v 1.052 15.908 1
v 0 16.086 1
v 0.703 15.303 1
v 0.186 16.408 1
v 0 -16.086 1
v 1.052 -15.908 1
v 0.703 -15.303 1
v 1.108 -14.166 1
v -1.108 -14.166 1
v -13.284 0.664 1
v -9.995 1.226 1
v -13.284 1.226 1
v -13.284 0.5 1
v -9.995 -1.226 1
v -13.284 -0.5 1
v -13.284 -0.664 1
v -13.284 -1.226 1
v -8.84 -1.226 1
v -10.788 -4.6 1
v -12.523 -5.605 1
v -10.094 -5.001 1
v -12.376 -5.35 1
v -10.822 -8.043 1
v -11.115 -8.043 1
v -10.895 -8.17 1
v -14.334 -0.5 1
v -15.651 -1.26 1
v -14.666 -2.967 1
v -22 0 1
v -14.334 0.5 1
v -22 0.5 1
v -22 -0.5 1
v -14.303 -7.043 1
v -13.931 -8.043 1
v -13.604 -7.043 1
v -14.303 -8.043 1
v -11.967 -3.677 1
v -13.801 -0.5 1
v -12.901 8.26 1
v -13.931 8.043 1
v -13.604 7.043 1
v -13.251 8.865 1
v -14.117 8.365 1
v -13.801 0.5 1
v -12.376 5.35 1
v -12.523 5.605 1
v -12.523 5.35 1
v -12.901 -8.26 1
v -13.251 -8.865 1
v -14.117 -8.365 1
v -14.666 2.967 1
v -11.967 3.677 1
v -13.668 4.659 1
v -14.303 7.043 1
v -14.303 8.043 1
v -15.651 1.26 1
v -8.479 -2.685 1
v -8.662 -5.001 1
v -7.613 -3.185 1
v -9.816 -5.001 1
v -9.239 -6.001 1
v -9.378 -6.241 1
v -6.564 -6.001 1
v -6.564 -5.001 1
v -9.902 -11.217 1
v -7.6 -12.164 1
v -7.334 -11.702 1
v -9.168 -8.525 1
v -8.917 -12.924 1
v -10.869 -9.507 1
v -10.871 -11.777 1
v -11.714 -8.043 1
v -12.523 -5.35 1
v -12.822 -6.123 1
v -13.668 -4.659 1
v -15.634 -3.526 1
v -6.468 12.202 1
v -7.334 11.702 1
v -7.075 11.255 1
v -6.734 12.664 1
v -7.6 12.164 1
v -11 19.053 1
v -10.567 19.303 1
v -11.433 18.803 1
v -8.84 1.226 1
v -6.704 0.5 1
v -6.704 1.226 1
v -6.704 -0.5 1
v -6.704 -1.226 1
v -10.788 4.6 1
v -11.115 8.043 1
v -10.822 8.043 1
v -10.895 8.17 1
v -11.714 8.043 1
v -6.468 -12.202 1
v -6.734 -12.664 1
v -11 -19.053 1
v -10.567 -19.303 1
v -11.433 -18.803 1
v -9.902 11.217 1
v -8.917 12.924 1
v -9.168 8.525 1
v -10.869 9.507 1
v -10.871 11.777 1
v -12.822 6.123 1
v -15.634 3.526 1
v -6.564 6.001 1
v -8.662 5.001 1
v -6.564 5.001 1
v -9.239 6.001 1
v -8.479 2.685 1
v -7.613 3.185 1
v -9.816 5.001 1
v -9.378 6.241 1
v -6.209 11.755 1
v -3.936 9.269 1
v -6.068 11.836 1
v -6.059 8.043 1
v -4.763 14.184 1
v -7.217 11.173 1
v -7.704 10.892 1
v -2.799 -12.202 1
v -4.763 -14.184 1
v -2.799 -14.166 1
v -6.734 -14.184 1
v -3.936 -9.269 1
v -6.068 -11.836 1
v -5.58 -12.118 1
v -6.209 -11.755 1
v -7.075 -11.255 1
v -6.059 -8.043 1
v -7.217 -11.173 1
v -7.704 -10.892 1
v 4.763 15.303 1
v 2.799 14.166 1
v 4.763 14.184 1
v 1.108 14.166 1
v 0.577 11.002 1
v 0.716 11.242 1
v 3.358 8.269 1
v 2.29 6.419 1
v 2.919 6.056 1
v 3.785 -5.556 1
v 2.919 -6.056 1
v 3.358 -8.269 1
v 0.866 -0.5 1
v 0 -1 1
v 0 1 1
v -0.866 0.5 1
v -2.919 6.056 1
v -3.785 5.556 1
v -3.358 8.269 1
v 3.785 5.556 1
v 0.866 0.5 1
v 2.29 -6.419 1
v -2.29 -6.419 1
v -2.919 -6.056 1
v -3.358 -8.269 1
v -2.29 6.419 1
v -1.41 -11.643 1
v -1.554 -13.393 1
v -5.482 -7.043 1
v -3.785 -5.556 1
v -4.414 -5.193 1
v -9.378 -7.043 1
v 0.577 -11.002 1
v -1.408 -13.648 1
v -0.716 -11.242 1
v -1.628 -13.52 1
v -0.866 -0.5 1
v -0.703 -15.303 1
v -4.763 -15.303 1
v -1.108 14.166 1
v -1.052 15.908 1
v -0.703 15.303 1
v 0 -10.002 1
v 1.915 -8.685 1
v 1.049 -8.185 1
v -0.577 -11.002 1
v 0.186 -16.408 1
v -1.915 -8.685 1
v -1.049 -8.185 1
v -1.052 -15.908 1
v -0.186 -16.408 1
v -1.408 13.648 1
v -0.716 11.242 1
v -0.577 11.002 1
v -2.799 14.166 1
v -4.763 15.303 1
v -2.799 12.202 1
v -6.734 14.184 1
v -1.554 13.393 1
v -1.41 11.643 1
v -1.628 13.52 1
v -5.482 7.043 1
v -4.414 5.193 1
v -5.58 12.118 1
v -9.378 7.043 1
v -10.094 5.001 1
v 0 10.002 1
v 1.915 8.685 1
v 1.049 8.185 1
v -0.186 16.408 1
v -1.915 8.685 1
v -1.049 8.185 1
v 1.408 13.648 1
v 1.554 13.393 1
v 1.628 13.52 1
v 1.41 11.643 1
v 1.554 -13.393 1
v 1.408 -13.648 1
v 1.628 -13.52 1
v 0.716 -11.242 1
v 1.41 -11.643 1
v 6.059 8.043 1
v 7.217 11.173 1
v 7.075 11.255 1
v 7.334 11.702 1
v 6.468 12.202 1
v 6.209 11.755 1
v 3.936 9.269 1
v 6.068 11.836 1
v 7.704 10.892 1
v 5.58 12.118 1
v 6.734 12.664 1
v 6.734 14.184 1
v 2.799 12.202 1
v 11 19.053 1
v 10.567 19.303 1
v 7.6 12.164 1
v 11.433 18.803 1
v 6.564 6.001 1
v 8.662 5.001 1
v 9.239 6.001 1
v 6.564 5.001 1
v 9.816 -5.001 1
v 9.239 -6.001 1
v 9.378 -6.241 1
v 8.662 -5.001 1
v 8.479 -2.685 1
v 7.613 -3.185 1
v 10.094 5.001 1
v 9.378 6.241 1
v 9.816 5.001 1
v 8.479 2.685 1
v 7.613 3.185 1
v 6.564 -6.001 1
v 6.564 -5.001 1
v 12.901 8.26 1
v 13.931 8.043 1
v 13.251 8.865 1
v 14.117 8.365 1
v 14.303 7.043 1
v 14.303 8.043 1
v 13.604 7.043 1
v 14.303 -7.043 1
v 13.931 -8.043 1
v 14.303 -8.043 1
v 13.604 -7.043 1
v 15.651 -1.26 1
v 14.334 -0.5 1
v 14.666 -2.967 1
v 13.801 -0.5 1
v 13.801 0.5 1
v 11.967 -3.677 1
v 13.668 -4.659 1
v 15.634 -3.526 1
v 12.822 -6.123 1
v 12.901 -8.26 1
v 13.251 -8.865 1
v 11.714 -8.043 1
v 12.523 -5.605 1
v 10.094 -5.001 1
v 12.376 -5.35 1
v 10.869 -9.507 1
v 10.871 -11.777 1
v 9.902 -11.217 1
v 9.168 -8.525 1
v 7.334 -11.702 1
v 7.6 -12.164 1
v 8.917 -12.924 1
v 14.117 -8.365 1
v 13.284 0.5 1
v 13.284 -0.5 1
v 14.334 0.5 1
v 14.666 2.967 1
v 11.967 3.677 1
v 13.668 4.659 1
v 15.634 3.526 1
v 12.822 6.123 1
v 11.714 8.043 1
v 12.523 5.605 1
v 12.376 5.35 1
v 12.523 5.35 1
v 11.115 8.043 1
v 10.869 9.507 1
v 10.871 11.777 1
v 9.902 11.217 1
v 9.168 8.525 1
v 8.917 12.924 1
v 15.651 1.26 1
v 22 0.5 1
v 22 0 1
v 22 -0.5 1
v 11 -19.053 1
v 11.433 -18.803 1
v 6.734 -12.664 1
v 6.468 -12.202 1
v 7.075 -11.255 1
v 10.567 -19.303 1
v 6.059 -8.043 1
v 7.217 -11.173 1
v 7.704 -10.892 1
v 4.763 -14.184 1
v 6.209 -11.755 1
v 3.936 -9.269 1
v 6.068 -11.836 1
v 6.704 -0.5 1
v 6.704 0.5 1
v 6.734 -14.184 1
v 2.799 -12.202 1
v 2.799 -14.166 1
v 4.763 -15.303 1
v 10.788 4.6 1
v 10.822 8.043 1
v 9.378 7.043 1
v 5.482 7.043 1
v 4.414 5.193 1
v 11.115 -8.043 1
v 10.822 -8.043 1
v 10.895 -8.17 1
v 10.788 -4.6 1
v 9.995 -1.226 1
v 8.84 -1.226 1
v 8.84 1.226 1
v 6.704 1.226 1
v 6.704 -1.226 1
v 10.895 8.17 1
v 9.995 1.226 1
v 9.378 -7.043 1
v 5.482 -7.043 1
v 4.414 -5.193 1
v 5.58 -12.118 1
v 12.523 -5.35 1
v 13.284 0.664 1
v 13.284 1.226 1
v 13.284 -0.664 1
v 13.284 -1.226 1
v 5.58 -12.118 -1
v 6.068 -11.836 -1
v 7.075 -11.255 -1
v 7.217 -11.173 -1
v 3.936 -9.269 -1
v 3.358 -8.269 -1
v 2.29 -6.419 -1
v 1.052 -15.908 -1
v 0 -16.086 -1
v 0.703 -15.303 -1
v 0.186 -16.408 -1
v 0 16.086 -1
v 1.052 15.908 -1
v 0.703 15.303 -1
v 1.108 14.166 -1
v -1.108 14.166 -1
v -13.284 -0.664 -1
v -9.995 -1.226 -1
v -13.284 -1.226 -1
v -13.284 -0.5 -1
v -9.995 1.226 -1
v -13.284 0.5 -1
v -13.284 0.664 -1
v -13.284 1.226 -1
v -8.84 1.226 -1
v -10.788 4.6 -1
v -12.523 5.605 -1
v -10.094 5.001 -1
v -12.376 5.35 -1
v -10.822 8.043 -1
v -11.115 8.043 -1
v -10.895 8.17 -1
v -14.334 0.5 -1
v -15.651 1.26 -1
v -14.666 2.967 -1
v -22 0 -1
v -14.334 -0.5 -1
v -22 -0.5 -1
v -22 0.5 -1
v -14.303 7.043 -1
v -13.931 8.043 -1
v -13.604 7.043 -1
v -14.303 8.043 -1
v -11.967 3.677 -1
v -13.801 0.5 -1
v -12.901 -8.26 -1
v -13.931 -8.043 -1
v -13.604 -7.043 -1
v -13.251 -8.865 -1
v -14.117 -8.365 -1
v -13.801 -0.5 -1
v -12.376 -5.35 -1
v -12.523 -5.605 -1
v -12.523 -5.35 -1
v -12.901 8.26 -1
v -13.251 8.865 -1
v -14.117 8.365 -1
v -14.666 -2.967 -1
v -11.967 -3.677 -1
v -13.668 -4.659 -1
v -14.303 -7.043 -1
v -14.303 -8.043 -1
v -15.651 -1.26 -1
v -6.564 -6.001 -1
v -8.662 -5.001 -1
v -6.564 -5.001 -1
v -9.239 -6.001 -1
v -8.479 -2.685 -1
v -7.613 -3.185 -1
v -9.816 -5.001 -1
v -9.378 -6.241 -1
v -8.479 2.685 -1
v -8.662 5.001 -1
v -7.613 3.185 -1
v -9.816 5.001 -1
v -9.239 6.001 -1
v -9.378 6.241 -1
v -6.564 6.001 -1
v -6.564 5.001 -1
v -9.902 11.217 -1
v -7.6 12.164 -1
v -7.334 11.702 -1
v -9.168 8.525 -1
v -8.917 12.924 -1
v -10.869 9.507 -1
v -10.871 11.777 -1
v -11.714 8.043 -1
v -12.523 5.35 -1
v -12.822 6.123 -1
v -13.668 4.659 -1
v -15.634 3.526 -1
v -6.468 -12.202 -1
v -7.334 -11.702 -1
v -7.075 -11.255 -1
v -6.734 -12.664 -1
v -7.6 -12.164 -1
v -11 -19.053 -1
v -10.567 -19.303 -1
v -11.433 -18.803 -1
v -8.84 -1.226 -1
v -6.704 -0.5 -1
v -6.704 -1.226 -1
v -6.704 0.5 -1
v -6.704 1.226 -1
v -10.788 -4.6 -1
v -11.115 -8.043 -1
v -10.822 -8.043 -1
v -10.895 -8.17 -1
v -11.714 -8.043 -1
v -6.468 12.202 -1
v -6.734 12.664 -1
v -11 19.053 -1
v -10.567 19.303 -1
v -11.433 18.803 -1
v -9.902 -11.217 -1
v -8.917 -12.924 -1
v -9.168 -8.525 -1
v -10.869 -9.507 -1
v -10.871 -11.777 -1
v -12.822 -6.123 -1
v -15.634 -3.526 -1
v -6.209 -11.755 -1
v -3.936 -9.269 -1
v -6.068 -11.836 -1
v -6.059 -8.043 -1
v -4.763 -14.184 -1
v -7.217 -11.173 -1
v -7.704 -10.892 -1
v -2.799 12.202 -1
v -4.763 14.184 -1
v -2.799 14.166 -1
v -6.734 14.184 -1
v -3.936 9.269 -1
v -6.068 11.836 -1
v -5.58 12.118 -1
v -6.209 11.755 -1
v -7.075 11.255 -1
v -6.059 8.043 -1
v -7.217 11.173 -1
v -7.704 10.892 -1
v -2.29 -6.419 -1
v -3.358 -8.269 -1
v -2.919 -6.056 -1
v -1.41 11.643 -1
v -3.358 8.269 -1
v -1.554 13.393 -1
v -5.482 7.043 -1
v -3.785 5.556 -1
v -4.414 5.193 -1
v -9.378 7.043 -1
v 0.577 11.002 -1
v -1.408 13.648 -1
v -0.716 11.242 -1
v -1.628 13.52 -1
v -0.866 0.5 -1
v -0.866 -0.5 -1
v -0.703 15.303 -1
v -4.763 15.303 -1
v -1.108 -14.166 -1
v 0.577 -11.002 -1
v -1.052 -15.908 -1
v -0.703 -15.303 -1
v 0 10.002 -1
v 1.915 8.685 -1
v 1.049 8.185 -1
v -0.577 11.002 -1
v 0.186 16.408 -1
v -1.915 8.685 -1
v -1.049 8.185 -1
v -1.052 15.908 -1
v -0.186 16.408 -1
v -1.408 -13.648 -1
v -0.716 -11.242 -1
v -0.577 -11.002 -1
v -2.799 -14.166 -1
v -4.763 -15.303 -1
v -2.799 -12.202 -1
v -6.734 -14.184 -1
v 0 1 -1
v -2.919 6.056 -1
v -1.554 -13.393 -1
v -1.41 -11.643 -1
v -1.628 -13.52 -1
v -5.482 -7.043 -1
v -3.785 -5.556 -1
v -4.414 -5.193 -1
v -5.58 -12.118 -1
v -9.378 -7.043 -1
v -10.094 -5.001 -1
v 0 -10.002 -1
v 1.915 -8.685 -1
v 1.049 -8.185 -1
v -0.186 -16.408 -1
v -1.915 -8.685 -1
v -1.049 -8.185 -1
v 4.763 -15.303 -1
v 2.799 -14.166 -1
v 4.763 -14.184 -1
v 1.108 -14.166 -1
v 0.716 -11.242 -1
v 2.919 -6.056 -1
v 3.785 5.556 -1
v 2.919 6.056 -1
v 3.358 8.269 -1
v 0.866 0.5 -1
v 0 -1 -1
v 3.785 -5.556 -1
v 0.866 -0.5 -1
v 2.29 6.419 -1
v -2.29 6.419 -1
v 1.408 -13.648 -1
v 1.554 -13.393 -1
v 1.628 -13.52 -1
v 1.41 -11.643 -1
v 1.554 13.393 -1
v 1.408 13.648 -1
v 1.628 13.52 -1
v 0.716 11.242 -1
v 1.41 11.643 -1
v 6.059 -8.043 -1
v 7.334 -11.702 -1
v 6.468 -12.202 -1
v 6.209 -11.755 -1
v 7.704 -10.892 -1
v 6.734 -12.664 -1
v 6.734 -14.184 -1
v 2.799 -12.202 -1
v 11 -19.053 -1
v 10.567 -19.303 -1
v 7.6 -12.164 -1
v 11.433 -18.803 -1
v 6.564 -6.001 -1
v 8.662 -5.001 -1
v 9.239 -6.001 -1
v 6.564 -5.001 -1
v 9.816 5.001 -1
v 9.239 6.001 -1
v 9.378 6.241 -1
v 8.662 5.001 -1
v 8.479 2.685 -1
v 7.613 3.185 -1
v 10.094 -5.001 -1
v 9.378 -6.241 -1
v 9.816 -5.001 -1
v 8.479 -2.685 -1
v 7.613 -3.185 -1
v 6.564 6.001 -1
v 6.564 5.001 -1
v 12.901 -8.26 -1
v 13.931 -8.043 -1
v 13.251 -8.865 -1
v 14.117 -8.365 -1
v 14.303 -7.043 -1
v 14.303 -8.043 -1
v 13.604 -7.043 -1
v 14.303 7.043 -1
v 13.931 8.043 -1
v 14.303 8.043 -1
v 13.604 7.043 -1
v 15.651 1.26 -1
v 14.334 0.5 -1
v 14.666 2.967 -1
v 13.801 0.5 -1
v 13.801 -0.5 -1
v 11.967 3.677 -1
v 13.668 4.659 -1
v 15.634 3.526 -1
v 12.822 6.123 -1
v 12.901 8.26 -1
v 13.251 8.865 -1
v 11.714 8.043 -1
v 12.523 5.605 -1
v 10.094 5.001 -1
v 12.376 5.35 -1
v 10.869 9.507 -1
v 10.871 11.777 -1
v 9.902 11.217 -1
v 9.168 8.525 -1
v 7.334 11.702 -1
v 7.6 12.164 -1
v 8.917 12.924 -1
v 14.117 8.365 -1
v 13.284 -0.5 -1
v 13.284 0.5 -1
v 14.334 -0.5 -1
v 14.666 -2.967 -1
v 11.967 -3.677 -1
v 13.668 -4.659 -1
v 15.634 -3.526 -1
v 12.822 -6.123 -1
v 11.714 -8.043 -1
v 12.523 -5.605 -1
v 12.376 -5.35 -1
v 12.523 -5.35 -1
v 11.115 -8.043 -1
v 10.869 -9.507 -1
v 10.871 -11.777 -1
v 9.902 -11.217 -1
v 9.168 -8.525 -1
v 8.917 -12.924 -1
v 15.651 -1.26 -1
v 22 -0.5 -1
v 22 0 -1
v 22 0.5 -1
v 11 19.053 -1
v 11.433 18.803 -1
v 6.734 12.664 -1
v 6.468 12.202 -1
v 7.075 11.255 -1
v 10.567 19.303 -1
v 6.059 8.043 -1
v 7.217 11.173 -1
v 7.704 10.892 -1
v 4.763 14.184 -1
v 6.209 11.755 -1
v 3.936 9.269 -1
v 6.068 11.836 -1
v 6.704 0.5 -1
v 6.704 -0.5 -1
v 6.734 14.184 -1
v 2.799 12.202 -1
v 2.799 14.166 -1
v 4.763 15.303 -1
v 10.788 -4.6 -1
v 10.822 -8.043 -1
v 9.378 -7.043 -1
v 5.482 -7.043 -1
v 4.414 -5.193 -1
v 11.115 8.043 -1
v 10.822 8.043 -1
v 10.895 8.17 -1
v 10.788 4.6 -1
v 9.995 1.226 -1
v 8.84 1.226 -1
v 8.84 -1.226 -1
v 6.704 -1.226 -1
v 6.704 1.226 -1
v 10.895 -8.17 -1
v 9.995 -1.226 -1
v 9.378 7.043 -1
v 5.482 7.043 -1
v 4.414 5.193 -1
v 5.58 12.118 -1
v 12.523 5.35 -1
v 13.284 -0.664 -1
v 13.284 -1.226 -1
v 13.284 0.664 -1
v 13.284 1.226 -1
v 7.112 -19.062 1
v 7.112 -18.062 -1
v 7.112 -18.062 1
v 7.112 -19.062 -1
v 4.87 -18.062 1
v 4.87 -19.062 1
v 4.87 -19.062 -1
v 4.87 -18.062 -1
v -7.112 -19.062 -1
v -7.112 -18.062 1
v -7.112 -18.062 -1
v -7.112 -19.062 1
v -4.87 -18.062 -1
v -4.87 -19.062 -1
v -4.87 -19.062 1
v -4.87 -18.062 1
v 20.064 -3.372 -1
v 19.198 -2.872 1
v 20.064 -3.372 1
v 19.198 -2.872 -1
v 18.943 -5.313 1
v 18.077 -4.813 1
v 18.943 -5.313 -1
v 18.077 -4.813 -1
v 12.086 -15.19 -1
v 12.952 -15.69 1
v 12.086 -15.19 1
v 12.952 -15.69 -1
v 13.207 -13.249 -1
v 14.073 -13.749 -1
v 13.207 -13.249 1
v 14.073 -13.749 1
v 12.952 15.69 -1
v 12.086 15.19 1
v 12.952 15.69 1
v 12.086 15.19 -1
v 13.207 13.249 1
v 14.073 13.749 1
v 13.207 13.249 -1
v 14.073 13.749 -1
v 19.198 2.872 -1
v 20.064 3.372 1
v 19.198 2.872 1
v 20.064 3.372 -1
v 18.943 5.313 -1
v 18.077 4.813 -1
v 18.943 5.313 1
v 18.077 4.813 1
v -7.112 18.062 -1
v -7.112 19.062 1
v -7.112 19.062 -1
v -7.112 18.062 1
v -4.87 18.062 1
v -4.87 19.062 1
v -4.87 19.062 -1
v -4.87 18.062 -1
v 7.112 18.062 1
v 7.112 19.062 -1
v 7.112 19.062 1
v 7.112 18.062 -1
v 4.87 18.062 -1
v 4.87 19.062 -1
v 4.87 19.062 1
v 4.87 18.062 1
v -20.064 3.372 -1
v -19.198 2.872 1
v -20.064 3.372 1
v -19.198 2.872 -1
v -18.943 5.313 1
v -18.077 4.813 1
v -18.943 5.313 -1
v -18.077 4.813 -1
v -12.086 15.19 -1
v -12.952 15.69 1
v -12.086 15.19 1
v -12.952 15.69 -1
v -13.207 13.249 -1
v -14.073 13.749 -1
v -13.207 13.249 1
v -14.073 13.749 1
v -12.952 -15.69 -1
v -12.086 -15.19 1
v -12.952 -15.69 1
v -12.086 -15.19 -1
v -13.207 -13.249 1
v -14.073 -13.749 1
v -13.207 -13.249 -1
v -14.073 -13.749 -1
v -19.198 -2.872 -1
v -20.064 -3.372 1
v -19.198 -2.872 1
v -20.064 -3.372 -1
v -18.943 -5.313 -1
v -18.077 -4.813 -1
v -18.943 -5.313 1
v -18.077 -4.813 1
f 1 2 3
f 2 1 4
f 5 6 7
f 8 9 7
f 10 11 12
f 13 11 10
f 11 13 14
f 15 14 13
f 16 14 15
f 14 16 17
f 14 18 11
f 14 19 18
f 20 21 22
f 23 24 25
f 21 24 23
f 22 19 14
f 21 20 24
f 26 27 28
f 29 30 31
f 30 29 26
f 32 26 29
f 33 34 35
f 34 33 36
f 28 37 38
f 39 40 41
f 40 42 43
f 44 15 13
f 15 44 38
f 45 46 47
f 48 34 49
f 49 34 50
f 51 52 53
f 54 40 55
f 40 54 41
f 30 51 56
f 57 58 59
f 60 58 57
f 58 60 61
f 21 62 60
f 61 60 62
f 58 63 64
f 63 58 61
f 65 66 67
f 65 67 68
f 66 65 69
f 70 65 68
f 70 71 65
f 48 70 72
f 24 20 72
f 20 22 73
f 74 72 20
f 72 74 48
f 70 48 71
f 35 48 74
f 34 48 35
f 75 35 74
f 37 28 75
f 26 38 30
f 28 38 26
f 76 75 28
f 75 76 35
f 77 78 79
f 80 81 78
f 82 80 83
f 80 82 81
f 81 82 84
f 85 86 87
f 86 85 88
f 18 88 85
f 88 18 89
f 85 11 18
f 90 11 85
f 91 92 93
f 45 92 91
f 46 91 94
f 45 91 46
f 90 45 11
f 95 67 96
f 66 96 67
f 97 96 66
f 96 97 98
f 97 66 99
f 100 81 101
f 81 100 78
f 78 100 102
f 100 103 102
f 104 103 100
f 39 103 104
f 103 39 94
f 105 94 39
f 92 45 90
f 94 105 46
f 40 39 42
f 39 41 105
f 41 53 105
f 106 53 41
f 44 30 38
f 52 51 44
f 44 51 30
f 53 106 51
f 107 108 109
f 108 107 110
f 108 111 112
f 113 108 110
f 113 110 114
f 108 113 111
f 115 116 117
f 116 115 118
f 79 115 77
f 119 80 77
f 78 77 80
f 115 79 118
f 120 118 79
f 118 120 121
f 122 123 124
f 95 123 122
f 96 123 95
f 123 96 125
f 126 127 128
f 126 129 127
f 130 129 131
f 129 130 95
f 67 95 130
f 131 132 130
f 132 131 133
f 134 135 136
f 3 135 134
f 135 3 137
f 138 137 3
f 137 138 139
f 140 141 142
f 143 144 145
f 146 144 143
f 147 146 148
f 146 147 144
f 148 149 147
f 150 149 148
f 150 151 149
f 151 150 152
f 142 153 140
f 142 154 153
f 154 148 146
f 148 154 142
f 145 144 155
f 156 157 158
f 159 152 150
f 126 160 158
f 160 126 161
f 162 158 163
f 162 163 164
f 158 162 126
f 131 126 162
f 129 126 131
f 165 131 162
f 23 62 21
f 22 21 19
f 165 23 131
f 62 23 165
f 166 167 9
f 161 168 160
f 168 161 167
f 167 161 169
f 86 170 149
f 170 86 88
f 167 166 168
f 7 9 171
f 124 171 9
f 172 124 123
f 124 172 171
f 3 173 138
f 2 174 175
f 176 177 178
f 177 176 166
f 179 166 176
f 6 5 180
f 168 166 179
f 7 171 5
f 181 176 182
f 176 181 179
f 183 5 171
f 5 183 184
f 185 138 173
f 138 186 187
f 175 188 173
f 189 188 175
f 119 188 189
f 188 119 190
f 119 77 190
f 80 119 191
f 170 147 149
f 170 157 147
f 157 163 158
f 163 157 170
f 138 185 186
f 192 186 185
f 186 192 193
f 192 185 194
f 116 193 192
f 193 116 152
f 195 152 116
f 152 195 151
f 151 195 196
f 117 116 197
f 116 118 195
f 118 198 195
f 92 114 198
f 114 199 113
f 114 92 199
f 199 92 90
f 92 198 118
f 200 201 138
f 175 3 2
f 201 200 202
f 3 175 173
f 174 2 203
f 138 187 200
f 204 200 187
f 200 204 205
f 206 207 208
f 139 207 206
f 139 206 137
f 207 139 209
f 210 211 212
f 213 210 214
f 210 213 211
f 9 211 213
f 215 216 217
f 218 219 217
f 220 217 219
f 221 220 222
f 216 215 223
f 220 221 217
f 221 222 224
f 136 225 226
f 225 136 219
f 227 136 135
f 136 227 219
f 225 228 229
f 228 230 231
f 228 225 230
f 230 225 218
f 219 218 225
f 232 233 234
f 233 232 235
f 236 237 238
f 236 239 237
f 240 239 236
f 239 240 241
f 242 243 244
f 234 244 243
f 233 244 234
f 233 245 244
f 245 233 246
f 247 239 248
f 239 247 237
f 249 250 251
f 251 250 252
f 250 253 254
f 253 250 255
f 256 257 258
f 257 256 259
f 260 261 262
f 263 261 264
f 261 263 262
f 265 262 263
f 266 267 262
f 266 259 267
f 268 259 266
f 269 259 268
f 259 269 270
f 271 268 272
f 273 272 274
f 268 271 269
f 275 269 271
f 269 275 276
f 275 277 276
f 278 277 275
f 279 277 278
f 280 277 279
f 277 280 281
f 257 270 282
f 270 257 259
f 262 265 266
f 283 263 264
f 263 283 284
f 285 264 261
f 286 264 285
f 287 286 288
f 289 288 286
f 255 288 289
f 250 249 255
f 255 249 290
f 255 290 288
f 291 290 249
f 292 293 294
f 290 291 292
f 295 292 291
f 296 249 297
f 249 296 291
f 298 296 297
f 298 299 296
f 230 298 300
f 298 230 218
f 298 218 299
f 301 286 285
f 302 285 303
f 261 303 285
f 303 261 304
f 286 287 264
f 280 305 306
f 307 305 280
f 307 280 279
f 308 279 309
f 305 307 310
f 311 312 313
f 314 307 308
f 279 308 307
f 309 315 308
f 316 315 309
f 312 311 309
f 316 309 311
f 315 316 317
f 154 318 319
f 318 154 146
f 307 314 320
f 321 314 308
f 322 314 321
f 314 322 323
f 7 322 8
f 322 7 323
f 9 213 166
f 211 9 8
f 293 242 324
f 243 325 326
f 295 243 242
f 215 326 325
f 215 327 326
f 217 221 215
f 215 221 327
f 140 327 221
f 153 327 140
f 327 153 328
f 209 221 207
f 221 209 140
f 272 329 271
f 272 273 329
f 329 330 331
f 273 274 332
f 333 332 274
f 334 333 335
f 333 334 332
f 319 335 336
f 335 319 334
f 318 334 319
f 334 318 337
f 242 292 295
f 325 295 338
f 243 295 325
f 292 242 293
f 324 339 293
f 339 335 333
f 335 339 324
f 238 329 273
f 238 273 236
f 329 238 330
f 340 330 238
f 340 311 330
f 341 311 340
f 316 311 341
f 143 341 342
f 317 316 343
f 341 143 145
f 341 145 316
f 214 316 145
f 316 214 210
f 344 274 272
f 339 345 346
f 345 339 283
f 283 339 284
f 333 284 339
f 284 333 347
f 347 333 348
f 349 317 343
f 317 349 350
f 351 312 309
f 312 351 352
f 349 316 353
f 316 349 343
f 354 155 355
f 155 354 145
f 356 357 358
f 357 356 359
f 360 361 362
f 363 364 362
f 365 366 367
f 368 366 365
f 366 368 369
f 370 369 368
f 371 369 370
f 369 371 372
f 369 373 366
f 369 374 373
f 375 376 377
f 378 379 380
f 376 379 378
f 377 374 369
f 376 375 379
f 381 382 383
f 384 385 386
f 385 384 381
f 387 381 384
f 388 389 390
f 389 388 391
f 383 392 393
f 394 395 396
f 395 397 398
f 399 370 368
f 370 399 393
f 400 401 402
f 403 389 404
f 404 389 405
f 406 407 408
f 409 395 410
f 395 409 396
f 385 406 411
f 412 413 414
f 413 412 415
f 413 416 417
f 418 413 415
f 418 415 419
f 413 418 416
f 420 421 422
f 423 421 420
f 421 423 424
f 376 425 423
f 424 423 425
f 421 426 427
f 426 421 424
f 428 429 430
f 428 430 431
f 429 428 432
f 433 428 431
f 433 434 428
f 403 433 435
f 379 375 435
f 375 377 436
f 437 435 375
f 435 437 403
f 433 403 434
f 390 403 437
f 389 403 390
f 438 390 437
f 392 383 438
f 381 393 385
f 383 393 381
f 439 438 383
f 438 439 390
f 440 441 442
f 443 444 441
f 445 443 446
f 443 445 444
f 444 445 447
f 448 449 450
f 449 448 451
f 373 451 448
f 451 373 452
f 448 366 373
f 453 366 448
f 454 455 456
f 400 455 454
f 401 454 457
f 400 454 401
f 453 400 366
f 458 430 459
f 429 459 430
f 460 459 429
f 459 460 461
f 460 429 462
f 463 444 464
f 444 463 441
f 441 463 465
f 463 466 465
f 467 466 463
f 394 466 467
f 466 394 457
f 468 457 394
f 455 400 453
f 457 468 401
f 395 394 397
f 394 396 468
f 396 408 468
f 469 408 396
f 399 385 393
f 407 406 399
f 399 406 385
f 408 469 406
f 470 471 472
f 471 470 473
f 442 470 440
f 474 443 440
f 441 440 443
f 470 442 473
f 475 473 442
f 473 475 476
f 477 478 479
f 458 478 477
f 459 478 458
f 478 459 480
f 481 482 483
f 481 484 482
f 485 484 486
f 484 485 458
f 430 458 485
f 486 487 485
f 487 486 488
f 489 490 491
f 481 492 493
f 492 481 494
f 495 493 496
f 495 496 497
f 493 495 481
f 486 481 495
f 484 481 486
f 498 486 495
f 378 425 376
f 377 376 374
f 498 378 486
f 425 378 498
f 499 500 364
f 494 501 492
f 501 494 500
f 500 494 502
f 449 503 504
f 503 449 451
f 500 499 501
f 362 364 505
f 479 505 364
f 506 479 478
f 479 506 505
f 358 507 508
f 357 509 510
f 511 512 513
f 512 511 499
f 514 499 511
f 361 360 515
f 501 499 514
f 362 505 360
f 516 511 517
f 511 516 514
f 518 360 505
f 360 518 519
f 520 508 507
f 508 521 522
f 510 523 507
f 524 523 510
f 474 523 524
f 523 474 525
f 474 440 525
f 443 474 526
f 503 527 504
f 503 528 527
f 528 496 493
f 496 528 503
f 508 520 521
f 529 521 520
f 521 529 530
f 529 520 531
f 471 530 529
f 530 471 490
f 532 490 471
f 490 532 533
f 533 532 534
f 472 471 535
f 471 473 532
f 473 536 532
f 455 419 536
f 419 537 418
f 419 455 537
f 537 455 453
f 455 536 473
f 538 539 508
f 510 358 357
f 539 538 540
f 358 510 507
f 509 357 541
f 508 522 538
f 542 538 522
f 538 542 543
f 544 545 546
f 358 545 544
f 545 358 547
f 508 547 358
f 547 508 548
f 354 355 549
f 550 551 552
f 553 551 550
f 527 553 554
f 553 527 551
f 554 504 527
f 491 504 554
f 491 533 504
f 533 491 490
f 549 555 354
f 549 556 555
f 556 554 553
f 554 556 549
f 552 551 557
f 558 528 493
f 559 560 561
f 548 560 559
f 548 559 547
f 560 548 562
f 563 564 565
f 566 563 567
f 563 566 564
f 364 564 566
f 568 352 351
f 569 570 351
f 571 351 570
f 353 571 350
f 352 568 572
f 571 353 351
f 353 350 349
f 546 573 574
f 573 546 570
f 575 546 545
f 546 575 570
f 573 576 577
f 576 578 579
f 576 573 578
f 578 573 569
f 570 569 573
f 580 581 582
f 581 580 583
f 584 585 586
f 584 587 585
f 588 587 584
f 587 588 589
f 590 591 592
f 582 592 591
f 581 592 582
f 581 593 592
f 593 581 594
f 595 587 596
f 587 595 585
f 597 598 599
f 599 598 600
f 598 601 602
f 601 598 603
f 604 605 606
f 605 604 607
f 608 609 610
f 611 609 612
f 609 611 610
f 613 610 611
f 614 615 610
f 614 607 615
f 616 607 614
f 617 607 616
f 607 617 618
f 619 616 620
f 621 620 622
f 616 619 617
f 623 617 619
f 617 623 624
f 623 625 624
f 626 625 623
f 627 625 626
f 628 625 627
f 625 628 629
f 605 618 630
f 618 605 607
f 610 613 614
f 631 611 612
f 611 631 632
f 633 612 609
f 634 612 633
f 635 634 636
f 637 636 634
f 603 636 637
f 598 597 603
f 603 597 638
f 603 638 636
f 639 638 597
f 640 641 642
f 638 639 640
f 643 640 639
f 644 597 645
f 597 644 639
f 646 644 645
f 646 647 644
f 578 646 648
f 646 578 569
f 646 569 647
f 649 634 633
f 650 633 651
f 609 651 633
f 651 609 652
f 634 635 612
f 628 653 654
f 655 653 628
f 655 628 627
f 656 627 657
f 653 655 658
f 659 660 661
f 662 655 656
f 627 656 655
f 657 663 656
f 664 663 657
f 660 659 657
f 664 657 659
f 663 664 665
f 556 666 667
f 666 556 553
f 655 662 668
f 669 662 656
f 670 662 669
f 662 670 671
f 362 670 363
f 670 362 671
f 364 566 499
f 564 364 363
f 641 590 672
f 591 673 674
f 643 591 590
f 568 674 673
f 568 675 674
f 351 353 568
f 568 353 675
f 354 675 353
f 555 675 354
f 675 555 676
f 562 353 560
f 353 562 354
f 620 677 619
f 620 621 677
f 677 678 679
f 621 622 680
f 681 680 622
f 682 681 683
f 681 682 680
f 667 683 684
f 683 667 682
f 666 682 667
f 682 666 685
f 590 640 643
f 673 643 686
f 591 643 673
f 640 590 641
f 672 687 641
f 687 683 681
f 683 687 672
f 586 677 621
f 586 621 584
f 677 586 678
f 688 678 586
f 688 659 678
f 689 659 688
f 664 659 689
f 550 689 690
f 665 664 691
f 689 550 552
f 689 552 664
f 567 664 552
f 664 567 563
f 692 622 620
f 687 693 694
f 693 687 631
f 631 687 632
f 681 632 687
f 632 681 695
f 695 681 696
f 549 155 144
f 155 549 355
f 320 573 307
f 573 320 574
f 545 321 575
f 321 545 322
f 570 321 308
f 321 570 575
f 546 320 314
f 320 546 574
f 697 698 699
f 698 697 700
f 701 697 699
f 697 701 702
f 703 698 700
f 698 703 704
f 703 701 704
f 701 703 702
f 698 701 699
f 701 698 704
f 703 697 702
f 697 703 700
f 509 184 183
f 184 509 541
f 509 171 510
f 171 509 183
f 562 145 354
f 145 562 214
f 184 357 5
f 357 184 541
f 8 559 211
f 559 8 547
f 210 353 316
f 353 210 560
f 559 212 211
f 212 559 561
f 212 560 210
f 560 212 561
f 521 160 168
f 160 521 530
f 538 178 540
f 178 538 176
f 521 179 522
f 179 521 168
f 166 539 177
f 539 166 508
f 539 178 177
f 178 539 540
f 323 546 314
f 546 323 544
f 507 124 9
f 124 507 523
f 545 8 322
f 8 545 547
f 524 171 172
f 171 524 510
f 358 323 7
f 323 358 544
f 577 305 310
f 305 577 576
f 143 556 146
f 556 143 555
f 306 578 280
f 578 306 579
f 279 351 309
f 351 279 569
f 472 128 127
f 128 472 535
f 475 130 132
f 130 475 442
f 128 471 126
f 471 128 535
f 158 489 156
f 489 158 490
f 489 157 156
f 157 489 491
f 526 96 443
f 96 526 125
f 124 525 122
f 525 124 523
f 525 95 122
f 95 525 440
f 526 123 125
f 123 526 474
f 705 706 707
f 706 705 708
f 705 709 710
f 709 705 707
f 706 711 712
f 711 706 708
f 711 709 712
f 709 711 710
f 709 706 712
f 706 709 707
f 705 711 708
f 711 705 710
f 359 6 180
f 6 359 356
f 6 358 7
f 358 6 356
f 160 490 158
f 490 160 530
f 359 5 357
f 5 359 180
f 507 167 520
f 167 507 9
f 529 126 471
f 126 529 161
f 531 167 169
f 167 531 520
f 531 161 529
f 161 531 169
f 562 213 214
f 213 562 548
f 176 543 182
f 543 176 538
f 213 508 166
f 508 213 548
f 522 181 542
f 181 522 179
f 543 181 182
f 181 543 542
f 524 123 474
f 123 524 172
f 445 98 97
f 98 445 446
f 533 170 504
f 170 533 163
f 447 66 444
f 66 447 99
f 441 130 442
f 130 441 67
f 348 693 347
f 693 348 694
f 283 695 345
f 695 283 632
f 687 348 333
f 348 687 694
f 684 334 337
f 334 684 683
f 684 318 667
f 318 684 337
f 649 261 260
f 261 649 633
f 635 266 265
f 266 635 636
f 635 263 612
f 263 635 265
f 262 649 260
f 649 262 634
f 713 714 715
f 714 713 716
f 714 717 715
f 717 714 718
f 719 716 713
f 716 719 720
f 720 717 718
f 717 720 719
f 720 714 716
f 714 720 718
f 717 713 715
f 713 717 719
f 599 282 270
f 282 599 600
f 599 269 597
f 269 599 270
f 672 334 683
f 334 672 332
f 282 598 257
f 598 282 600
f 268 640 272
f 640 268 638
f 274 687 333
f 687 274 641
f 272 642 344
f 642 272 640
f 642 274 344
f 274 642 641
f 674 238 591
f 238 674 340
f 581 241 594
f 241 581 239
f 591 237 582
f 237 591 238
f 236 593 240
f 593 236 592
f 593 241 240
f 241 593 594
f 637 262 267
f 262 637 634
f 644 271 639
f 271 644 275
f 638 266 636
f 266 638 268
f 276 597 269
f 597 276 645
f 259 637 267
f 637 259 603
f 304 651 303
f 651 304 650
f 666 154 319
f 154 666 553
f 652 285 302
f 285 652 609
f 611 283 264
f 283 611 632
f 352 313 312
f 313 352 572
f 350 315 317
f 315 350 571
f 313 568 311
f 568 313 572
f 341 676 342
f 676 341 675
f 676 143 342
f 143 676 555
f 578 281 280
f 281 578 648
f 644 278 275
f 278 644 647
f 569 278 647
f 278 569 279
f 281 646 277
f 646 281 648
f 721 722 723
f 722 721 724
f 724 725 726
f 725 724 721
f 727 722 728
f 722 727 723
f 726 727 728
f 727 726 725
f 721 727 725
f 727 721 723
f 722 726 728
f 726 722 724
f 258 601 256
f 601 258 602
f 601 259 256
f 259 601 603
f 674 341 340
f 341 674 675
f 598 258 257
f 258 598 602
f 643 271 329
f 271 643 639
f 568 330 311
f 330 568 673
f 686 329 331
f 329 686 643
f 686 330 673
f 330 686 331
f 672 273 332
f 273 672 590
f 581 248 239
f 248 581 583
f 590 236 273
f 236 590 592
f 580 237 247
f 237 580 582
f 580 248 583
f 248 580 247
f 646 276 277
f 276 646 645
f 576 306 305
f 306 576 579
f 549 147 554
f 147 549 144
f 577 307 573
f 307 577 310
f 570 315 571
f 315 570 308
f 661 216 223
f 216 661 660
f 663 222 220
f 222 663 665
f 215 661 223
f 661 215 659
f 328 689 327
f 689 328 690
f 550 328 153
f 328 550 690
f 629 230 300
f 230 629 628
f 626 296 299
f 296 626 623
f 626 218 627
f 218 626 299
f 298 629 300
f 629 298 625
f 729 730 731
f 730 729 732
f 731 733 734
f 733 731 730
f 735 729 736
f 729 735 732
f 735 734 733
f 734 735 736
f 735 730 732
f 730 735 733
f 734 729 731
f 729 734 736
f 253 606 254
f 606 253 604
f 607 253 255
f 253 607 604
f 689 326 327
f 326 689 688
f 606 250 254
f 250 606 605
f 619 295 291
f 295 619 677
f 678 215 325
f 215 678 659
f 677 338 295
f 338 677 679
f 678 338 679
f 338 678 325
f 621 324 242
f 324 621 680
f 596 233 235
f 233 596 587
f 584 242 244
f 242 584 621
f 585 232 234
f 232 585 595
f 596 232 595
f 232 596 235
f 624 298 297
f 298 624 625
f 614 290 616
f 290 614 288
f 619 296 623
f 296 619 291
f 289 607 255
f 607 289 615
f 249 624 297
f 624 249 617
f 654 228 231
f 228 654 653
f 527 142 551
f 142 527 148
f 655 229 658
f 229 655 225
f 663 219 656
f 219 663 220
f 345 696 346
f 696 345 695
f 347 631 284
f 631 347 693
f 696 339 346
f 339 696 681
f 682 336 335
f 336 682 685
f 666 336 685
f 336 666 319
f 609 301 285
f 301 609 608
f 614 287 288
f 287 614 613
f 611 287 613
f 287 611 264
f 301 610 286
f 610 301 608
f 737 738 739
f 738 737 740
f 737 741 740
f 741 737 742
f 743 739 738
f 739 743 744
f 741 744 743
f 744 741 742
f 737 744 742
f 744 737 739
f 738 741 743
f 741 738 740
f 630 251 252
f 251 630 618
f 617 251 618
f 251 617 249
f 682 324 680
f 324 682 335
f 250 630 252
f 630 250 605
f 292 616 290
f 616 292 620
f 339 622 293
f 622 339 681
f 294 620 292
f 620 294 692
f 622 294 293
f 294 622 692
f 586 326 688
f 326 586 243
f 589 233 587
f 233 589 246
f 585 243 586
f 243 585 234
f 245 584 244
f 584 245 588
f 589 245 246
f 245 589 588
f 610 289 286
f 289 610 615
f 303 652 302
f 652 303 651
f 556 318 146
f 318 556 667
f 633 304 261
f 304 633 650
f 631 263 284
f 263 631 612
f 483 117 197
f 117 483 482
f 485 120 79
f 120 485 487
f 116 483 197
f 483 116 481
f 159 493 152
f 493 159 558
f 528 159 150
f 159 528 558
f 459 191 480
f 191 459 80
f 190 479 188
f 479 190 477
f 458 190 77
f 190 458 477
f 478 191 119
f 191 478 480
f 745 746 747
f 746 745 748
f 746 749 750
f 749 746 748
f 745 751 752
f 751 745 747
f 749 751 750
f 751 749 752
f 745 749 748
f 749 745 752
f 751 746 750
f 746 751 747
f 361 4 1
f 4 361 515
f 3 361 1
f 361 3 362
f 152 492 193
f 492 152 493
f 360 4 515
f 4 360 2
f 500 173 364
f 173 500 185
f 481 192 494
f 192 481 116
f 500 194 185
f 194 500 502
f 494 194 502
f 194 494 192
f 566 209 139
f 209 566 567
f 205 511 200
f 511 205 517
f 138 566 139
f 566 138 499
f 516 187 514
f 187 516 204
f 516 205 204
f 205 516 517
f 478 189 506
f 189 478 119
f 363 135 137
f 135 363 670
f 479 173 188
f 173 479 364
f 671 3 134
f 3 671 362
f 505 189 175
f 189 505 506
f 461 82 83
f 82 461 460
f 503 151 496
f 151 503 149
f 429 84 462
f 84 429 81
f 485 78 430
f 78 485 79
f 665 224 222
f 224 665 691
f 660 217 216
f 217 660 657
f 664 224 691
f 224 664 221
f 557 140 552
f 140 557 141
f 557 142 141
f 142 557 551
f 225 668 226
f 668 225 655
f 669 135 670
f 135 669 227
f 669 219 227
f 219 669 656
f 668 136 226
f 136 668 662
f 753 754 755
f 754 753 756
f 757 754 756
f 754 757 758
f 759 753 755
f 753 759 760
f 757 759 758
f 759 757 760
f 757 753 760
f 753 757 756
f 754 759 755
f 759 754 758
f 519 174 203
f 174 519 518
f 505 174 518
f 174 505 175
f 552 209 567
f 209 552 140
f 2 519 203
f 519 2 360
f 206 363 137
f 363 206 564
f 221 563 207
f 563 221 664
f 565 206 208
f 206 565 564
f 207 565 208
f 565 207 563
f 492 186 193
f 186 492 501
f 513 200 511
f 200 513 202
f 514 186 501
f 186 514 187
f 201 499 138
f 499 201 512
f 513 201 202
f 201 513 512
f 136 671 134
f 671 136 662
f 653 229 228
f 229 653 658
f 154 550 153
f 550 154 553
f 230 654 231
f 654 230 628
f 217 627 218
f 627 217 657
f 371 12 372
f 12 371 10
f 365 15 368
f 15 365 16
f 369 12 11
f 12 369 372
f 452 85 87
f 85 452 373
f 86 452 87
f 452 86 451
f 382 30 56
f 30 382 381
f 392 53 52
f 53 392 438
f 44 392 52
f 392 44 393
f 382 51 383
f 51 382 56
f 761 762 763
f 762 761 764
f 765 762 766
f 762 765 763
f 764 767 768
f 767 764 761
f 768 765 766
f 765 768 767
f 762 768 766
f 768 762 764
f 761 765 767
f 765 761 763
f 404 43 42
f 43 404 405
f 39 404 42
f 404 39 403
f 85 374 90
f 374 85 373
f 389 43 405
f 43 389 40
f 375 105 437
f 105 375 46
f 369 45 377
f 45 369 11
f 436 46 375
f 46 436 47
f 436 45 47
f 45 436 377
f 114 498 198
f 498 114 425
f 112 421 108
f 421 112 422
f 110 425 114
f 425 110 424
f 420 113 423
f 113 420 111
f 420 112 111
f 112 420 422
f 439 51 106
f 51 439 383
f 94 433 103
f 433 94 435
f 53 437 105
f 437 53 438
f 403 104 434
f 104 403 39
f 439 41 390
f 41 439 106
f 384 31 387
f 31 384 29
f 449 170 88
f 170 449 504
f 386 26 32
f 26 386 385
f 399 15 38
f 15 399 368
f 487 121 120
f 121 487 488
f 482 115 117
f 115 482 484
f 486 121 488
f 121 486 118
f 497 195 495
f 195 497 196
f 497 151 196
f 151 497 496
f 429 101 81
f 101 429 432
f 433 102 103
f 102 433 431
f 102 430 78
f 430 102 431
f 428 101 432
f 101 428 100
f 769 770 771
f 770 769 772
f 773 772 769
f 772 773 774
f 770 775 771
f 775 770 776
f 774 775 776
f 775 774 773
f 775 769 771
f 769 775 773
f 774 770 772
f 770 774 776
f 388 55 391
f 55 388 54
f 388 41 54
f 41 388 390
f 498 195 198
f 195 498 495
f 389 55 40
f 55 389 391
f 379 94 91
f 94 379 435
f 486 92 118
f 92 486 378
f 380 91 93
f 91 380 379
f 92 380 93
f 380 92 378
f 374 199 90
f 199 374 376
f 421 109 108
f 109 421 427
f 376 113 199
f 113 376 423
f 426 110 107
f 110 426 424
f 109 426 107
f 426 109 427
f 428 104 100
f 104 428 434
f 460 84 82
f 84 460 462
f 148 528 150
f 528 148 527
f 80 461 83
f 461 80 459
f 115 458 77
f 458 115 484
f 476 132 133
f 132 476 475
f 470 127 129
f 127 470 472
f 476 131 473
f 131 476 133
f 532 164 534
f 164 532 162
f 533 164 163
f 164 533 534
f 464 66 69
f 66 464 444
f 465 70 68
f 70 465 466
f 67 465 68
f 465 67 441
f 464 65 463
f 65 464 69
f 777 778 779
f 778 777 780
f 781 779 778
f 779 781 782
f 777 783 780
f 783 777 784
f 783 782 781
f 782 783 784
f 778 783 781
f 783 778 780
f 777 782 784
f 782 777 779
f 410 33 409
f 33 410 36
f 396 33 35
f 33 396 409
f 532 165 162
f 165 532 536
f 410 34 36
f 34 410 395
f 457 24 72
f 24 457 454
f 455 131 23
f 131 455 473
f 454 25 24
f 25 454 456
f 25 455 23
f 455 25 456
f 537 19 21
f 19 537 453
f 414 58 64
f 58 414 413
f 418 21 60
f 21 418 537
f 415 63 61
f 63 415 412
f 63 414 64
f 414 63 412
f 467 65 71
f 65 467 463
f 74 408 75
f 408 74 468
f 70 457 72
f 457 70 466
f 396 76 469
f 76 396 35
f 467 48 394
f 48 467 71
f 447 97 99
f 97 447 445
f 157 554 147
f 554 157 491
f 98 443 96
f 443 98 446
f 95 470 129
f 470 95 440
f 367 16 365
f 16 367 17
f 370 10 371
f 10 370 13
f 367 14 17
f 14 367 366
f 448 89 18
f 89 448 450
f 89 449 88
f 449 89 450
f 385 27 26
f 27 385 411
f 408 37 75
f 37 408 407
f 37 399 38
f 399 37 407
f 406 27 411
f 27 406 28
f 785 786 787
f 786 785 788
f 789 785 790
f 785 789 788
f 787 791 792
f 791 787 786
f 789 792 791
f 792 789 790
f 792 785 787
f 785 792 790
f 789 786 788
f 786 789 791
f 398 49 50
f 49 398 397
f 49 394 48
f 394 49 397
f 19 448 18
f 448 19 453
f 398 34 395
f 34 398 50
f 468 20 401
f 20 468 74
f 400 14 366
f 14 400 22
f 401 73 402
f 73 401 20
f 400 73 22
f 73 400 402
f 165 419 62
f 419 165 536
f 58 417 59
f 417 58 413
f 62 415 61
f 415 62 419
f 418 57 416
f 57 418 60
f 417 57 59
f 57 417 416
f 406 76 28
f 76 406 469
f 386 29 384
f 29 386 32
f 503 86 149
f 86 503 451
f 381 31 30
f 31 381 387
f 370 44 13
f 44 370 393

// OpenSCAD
// [FL_INDEX: keywords="openscad, 3d_parametric, Parametric_Snowflake_Generator_for_Customizer, csg_solid" | COT="Parametric OpenSCAD design from 3DCodeverse"]
// Title: Parametric Snowflake Generator for Customizer

//Parametric Snowflake Generator by Gringer Thing:39685

edge_length = 22;//[10:22]
flake_thickness=2;//[2:5]

extrude_width=10;//[1:10]
//multiplied by 4
number_of_crystals = 3; // [1:5]

backbone_width= 1; // [1:5]
el=edge_length;
ft=flake_thickness;
cmt=edge_length / 5;
xw=extrude_width/10;
nc=number_of_crystals*4;
bw=backbone_width;
cit = xw; // 
th = sqrt(3) * el/2; // triangle height
rv = rands(0,1,nc*5); // random vector (x, y, length, direction, thickness)


// the idea on how to do this is loosely based on origami snowflakes as at:
// http://www.marthastewart.com/276331/how-to-make-paper-snowflakes
// combined with Wilson Bentley's observations of snowflakes
// http://en.wikipedia.org/wiki/Wilson_Bentley

module flake_part(){
	rotate([0,0,30]) translate([0,-el/2,0])
		cube([bw,el,ft], center = true);
	for(i = [0:nc-1]){
		assign(yr = sqrt(rv[i*4]),
		   xr = rv[i*4+1] * sqrt(rv[i*4]),
		   rt = (rv[i*4+2]<(1/3))?0:(rv[i*4+2]<(2/3))?60:120,
		   sl = rv[i*4+3],
		   ct = (rv[i*4+4])*(rv[i*4+4])){
			if(((rt != 120) || (yr + sl/2 < 1)) && (sl*el/2 > xw)){
				translate([xr*el/2, -yr*th,0]) rotate(rt)
					cube([sl*el/2, cit + max(0,cmt*ct/2-cit), ft], 
					   center = true, $fa = 60);
			}
		}
	}
}

for(ri = [0:60:300]){
	rotate([0,0,ri]) flake_part();
	rotate([0,180,ri]) flake_part();
}
